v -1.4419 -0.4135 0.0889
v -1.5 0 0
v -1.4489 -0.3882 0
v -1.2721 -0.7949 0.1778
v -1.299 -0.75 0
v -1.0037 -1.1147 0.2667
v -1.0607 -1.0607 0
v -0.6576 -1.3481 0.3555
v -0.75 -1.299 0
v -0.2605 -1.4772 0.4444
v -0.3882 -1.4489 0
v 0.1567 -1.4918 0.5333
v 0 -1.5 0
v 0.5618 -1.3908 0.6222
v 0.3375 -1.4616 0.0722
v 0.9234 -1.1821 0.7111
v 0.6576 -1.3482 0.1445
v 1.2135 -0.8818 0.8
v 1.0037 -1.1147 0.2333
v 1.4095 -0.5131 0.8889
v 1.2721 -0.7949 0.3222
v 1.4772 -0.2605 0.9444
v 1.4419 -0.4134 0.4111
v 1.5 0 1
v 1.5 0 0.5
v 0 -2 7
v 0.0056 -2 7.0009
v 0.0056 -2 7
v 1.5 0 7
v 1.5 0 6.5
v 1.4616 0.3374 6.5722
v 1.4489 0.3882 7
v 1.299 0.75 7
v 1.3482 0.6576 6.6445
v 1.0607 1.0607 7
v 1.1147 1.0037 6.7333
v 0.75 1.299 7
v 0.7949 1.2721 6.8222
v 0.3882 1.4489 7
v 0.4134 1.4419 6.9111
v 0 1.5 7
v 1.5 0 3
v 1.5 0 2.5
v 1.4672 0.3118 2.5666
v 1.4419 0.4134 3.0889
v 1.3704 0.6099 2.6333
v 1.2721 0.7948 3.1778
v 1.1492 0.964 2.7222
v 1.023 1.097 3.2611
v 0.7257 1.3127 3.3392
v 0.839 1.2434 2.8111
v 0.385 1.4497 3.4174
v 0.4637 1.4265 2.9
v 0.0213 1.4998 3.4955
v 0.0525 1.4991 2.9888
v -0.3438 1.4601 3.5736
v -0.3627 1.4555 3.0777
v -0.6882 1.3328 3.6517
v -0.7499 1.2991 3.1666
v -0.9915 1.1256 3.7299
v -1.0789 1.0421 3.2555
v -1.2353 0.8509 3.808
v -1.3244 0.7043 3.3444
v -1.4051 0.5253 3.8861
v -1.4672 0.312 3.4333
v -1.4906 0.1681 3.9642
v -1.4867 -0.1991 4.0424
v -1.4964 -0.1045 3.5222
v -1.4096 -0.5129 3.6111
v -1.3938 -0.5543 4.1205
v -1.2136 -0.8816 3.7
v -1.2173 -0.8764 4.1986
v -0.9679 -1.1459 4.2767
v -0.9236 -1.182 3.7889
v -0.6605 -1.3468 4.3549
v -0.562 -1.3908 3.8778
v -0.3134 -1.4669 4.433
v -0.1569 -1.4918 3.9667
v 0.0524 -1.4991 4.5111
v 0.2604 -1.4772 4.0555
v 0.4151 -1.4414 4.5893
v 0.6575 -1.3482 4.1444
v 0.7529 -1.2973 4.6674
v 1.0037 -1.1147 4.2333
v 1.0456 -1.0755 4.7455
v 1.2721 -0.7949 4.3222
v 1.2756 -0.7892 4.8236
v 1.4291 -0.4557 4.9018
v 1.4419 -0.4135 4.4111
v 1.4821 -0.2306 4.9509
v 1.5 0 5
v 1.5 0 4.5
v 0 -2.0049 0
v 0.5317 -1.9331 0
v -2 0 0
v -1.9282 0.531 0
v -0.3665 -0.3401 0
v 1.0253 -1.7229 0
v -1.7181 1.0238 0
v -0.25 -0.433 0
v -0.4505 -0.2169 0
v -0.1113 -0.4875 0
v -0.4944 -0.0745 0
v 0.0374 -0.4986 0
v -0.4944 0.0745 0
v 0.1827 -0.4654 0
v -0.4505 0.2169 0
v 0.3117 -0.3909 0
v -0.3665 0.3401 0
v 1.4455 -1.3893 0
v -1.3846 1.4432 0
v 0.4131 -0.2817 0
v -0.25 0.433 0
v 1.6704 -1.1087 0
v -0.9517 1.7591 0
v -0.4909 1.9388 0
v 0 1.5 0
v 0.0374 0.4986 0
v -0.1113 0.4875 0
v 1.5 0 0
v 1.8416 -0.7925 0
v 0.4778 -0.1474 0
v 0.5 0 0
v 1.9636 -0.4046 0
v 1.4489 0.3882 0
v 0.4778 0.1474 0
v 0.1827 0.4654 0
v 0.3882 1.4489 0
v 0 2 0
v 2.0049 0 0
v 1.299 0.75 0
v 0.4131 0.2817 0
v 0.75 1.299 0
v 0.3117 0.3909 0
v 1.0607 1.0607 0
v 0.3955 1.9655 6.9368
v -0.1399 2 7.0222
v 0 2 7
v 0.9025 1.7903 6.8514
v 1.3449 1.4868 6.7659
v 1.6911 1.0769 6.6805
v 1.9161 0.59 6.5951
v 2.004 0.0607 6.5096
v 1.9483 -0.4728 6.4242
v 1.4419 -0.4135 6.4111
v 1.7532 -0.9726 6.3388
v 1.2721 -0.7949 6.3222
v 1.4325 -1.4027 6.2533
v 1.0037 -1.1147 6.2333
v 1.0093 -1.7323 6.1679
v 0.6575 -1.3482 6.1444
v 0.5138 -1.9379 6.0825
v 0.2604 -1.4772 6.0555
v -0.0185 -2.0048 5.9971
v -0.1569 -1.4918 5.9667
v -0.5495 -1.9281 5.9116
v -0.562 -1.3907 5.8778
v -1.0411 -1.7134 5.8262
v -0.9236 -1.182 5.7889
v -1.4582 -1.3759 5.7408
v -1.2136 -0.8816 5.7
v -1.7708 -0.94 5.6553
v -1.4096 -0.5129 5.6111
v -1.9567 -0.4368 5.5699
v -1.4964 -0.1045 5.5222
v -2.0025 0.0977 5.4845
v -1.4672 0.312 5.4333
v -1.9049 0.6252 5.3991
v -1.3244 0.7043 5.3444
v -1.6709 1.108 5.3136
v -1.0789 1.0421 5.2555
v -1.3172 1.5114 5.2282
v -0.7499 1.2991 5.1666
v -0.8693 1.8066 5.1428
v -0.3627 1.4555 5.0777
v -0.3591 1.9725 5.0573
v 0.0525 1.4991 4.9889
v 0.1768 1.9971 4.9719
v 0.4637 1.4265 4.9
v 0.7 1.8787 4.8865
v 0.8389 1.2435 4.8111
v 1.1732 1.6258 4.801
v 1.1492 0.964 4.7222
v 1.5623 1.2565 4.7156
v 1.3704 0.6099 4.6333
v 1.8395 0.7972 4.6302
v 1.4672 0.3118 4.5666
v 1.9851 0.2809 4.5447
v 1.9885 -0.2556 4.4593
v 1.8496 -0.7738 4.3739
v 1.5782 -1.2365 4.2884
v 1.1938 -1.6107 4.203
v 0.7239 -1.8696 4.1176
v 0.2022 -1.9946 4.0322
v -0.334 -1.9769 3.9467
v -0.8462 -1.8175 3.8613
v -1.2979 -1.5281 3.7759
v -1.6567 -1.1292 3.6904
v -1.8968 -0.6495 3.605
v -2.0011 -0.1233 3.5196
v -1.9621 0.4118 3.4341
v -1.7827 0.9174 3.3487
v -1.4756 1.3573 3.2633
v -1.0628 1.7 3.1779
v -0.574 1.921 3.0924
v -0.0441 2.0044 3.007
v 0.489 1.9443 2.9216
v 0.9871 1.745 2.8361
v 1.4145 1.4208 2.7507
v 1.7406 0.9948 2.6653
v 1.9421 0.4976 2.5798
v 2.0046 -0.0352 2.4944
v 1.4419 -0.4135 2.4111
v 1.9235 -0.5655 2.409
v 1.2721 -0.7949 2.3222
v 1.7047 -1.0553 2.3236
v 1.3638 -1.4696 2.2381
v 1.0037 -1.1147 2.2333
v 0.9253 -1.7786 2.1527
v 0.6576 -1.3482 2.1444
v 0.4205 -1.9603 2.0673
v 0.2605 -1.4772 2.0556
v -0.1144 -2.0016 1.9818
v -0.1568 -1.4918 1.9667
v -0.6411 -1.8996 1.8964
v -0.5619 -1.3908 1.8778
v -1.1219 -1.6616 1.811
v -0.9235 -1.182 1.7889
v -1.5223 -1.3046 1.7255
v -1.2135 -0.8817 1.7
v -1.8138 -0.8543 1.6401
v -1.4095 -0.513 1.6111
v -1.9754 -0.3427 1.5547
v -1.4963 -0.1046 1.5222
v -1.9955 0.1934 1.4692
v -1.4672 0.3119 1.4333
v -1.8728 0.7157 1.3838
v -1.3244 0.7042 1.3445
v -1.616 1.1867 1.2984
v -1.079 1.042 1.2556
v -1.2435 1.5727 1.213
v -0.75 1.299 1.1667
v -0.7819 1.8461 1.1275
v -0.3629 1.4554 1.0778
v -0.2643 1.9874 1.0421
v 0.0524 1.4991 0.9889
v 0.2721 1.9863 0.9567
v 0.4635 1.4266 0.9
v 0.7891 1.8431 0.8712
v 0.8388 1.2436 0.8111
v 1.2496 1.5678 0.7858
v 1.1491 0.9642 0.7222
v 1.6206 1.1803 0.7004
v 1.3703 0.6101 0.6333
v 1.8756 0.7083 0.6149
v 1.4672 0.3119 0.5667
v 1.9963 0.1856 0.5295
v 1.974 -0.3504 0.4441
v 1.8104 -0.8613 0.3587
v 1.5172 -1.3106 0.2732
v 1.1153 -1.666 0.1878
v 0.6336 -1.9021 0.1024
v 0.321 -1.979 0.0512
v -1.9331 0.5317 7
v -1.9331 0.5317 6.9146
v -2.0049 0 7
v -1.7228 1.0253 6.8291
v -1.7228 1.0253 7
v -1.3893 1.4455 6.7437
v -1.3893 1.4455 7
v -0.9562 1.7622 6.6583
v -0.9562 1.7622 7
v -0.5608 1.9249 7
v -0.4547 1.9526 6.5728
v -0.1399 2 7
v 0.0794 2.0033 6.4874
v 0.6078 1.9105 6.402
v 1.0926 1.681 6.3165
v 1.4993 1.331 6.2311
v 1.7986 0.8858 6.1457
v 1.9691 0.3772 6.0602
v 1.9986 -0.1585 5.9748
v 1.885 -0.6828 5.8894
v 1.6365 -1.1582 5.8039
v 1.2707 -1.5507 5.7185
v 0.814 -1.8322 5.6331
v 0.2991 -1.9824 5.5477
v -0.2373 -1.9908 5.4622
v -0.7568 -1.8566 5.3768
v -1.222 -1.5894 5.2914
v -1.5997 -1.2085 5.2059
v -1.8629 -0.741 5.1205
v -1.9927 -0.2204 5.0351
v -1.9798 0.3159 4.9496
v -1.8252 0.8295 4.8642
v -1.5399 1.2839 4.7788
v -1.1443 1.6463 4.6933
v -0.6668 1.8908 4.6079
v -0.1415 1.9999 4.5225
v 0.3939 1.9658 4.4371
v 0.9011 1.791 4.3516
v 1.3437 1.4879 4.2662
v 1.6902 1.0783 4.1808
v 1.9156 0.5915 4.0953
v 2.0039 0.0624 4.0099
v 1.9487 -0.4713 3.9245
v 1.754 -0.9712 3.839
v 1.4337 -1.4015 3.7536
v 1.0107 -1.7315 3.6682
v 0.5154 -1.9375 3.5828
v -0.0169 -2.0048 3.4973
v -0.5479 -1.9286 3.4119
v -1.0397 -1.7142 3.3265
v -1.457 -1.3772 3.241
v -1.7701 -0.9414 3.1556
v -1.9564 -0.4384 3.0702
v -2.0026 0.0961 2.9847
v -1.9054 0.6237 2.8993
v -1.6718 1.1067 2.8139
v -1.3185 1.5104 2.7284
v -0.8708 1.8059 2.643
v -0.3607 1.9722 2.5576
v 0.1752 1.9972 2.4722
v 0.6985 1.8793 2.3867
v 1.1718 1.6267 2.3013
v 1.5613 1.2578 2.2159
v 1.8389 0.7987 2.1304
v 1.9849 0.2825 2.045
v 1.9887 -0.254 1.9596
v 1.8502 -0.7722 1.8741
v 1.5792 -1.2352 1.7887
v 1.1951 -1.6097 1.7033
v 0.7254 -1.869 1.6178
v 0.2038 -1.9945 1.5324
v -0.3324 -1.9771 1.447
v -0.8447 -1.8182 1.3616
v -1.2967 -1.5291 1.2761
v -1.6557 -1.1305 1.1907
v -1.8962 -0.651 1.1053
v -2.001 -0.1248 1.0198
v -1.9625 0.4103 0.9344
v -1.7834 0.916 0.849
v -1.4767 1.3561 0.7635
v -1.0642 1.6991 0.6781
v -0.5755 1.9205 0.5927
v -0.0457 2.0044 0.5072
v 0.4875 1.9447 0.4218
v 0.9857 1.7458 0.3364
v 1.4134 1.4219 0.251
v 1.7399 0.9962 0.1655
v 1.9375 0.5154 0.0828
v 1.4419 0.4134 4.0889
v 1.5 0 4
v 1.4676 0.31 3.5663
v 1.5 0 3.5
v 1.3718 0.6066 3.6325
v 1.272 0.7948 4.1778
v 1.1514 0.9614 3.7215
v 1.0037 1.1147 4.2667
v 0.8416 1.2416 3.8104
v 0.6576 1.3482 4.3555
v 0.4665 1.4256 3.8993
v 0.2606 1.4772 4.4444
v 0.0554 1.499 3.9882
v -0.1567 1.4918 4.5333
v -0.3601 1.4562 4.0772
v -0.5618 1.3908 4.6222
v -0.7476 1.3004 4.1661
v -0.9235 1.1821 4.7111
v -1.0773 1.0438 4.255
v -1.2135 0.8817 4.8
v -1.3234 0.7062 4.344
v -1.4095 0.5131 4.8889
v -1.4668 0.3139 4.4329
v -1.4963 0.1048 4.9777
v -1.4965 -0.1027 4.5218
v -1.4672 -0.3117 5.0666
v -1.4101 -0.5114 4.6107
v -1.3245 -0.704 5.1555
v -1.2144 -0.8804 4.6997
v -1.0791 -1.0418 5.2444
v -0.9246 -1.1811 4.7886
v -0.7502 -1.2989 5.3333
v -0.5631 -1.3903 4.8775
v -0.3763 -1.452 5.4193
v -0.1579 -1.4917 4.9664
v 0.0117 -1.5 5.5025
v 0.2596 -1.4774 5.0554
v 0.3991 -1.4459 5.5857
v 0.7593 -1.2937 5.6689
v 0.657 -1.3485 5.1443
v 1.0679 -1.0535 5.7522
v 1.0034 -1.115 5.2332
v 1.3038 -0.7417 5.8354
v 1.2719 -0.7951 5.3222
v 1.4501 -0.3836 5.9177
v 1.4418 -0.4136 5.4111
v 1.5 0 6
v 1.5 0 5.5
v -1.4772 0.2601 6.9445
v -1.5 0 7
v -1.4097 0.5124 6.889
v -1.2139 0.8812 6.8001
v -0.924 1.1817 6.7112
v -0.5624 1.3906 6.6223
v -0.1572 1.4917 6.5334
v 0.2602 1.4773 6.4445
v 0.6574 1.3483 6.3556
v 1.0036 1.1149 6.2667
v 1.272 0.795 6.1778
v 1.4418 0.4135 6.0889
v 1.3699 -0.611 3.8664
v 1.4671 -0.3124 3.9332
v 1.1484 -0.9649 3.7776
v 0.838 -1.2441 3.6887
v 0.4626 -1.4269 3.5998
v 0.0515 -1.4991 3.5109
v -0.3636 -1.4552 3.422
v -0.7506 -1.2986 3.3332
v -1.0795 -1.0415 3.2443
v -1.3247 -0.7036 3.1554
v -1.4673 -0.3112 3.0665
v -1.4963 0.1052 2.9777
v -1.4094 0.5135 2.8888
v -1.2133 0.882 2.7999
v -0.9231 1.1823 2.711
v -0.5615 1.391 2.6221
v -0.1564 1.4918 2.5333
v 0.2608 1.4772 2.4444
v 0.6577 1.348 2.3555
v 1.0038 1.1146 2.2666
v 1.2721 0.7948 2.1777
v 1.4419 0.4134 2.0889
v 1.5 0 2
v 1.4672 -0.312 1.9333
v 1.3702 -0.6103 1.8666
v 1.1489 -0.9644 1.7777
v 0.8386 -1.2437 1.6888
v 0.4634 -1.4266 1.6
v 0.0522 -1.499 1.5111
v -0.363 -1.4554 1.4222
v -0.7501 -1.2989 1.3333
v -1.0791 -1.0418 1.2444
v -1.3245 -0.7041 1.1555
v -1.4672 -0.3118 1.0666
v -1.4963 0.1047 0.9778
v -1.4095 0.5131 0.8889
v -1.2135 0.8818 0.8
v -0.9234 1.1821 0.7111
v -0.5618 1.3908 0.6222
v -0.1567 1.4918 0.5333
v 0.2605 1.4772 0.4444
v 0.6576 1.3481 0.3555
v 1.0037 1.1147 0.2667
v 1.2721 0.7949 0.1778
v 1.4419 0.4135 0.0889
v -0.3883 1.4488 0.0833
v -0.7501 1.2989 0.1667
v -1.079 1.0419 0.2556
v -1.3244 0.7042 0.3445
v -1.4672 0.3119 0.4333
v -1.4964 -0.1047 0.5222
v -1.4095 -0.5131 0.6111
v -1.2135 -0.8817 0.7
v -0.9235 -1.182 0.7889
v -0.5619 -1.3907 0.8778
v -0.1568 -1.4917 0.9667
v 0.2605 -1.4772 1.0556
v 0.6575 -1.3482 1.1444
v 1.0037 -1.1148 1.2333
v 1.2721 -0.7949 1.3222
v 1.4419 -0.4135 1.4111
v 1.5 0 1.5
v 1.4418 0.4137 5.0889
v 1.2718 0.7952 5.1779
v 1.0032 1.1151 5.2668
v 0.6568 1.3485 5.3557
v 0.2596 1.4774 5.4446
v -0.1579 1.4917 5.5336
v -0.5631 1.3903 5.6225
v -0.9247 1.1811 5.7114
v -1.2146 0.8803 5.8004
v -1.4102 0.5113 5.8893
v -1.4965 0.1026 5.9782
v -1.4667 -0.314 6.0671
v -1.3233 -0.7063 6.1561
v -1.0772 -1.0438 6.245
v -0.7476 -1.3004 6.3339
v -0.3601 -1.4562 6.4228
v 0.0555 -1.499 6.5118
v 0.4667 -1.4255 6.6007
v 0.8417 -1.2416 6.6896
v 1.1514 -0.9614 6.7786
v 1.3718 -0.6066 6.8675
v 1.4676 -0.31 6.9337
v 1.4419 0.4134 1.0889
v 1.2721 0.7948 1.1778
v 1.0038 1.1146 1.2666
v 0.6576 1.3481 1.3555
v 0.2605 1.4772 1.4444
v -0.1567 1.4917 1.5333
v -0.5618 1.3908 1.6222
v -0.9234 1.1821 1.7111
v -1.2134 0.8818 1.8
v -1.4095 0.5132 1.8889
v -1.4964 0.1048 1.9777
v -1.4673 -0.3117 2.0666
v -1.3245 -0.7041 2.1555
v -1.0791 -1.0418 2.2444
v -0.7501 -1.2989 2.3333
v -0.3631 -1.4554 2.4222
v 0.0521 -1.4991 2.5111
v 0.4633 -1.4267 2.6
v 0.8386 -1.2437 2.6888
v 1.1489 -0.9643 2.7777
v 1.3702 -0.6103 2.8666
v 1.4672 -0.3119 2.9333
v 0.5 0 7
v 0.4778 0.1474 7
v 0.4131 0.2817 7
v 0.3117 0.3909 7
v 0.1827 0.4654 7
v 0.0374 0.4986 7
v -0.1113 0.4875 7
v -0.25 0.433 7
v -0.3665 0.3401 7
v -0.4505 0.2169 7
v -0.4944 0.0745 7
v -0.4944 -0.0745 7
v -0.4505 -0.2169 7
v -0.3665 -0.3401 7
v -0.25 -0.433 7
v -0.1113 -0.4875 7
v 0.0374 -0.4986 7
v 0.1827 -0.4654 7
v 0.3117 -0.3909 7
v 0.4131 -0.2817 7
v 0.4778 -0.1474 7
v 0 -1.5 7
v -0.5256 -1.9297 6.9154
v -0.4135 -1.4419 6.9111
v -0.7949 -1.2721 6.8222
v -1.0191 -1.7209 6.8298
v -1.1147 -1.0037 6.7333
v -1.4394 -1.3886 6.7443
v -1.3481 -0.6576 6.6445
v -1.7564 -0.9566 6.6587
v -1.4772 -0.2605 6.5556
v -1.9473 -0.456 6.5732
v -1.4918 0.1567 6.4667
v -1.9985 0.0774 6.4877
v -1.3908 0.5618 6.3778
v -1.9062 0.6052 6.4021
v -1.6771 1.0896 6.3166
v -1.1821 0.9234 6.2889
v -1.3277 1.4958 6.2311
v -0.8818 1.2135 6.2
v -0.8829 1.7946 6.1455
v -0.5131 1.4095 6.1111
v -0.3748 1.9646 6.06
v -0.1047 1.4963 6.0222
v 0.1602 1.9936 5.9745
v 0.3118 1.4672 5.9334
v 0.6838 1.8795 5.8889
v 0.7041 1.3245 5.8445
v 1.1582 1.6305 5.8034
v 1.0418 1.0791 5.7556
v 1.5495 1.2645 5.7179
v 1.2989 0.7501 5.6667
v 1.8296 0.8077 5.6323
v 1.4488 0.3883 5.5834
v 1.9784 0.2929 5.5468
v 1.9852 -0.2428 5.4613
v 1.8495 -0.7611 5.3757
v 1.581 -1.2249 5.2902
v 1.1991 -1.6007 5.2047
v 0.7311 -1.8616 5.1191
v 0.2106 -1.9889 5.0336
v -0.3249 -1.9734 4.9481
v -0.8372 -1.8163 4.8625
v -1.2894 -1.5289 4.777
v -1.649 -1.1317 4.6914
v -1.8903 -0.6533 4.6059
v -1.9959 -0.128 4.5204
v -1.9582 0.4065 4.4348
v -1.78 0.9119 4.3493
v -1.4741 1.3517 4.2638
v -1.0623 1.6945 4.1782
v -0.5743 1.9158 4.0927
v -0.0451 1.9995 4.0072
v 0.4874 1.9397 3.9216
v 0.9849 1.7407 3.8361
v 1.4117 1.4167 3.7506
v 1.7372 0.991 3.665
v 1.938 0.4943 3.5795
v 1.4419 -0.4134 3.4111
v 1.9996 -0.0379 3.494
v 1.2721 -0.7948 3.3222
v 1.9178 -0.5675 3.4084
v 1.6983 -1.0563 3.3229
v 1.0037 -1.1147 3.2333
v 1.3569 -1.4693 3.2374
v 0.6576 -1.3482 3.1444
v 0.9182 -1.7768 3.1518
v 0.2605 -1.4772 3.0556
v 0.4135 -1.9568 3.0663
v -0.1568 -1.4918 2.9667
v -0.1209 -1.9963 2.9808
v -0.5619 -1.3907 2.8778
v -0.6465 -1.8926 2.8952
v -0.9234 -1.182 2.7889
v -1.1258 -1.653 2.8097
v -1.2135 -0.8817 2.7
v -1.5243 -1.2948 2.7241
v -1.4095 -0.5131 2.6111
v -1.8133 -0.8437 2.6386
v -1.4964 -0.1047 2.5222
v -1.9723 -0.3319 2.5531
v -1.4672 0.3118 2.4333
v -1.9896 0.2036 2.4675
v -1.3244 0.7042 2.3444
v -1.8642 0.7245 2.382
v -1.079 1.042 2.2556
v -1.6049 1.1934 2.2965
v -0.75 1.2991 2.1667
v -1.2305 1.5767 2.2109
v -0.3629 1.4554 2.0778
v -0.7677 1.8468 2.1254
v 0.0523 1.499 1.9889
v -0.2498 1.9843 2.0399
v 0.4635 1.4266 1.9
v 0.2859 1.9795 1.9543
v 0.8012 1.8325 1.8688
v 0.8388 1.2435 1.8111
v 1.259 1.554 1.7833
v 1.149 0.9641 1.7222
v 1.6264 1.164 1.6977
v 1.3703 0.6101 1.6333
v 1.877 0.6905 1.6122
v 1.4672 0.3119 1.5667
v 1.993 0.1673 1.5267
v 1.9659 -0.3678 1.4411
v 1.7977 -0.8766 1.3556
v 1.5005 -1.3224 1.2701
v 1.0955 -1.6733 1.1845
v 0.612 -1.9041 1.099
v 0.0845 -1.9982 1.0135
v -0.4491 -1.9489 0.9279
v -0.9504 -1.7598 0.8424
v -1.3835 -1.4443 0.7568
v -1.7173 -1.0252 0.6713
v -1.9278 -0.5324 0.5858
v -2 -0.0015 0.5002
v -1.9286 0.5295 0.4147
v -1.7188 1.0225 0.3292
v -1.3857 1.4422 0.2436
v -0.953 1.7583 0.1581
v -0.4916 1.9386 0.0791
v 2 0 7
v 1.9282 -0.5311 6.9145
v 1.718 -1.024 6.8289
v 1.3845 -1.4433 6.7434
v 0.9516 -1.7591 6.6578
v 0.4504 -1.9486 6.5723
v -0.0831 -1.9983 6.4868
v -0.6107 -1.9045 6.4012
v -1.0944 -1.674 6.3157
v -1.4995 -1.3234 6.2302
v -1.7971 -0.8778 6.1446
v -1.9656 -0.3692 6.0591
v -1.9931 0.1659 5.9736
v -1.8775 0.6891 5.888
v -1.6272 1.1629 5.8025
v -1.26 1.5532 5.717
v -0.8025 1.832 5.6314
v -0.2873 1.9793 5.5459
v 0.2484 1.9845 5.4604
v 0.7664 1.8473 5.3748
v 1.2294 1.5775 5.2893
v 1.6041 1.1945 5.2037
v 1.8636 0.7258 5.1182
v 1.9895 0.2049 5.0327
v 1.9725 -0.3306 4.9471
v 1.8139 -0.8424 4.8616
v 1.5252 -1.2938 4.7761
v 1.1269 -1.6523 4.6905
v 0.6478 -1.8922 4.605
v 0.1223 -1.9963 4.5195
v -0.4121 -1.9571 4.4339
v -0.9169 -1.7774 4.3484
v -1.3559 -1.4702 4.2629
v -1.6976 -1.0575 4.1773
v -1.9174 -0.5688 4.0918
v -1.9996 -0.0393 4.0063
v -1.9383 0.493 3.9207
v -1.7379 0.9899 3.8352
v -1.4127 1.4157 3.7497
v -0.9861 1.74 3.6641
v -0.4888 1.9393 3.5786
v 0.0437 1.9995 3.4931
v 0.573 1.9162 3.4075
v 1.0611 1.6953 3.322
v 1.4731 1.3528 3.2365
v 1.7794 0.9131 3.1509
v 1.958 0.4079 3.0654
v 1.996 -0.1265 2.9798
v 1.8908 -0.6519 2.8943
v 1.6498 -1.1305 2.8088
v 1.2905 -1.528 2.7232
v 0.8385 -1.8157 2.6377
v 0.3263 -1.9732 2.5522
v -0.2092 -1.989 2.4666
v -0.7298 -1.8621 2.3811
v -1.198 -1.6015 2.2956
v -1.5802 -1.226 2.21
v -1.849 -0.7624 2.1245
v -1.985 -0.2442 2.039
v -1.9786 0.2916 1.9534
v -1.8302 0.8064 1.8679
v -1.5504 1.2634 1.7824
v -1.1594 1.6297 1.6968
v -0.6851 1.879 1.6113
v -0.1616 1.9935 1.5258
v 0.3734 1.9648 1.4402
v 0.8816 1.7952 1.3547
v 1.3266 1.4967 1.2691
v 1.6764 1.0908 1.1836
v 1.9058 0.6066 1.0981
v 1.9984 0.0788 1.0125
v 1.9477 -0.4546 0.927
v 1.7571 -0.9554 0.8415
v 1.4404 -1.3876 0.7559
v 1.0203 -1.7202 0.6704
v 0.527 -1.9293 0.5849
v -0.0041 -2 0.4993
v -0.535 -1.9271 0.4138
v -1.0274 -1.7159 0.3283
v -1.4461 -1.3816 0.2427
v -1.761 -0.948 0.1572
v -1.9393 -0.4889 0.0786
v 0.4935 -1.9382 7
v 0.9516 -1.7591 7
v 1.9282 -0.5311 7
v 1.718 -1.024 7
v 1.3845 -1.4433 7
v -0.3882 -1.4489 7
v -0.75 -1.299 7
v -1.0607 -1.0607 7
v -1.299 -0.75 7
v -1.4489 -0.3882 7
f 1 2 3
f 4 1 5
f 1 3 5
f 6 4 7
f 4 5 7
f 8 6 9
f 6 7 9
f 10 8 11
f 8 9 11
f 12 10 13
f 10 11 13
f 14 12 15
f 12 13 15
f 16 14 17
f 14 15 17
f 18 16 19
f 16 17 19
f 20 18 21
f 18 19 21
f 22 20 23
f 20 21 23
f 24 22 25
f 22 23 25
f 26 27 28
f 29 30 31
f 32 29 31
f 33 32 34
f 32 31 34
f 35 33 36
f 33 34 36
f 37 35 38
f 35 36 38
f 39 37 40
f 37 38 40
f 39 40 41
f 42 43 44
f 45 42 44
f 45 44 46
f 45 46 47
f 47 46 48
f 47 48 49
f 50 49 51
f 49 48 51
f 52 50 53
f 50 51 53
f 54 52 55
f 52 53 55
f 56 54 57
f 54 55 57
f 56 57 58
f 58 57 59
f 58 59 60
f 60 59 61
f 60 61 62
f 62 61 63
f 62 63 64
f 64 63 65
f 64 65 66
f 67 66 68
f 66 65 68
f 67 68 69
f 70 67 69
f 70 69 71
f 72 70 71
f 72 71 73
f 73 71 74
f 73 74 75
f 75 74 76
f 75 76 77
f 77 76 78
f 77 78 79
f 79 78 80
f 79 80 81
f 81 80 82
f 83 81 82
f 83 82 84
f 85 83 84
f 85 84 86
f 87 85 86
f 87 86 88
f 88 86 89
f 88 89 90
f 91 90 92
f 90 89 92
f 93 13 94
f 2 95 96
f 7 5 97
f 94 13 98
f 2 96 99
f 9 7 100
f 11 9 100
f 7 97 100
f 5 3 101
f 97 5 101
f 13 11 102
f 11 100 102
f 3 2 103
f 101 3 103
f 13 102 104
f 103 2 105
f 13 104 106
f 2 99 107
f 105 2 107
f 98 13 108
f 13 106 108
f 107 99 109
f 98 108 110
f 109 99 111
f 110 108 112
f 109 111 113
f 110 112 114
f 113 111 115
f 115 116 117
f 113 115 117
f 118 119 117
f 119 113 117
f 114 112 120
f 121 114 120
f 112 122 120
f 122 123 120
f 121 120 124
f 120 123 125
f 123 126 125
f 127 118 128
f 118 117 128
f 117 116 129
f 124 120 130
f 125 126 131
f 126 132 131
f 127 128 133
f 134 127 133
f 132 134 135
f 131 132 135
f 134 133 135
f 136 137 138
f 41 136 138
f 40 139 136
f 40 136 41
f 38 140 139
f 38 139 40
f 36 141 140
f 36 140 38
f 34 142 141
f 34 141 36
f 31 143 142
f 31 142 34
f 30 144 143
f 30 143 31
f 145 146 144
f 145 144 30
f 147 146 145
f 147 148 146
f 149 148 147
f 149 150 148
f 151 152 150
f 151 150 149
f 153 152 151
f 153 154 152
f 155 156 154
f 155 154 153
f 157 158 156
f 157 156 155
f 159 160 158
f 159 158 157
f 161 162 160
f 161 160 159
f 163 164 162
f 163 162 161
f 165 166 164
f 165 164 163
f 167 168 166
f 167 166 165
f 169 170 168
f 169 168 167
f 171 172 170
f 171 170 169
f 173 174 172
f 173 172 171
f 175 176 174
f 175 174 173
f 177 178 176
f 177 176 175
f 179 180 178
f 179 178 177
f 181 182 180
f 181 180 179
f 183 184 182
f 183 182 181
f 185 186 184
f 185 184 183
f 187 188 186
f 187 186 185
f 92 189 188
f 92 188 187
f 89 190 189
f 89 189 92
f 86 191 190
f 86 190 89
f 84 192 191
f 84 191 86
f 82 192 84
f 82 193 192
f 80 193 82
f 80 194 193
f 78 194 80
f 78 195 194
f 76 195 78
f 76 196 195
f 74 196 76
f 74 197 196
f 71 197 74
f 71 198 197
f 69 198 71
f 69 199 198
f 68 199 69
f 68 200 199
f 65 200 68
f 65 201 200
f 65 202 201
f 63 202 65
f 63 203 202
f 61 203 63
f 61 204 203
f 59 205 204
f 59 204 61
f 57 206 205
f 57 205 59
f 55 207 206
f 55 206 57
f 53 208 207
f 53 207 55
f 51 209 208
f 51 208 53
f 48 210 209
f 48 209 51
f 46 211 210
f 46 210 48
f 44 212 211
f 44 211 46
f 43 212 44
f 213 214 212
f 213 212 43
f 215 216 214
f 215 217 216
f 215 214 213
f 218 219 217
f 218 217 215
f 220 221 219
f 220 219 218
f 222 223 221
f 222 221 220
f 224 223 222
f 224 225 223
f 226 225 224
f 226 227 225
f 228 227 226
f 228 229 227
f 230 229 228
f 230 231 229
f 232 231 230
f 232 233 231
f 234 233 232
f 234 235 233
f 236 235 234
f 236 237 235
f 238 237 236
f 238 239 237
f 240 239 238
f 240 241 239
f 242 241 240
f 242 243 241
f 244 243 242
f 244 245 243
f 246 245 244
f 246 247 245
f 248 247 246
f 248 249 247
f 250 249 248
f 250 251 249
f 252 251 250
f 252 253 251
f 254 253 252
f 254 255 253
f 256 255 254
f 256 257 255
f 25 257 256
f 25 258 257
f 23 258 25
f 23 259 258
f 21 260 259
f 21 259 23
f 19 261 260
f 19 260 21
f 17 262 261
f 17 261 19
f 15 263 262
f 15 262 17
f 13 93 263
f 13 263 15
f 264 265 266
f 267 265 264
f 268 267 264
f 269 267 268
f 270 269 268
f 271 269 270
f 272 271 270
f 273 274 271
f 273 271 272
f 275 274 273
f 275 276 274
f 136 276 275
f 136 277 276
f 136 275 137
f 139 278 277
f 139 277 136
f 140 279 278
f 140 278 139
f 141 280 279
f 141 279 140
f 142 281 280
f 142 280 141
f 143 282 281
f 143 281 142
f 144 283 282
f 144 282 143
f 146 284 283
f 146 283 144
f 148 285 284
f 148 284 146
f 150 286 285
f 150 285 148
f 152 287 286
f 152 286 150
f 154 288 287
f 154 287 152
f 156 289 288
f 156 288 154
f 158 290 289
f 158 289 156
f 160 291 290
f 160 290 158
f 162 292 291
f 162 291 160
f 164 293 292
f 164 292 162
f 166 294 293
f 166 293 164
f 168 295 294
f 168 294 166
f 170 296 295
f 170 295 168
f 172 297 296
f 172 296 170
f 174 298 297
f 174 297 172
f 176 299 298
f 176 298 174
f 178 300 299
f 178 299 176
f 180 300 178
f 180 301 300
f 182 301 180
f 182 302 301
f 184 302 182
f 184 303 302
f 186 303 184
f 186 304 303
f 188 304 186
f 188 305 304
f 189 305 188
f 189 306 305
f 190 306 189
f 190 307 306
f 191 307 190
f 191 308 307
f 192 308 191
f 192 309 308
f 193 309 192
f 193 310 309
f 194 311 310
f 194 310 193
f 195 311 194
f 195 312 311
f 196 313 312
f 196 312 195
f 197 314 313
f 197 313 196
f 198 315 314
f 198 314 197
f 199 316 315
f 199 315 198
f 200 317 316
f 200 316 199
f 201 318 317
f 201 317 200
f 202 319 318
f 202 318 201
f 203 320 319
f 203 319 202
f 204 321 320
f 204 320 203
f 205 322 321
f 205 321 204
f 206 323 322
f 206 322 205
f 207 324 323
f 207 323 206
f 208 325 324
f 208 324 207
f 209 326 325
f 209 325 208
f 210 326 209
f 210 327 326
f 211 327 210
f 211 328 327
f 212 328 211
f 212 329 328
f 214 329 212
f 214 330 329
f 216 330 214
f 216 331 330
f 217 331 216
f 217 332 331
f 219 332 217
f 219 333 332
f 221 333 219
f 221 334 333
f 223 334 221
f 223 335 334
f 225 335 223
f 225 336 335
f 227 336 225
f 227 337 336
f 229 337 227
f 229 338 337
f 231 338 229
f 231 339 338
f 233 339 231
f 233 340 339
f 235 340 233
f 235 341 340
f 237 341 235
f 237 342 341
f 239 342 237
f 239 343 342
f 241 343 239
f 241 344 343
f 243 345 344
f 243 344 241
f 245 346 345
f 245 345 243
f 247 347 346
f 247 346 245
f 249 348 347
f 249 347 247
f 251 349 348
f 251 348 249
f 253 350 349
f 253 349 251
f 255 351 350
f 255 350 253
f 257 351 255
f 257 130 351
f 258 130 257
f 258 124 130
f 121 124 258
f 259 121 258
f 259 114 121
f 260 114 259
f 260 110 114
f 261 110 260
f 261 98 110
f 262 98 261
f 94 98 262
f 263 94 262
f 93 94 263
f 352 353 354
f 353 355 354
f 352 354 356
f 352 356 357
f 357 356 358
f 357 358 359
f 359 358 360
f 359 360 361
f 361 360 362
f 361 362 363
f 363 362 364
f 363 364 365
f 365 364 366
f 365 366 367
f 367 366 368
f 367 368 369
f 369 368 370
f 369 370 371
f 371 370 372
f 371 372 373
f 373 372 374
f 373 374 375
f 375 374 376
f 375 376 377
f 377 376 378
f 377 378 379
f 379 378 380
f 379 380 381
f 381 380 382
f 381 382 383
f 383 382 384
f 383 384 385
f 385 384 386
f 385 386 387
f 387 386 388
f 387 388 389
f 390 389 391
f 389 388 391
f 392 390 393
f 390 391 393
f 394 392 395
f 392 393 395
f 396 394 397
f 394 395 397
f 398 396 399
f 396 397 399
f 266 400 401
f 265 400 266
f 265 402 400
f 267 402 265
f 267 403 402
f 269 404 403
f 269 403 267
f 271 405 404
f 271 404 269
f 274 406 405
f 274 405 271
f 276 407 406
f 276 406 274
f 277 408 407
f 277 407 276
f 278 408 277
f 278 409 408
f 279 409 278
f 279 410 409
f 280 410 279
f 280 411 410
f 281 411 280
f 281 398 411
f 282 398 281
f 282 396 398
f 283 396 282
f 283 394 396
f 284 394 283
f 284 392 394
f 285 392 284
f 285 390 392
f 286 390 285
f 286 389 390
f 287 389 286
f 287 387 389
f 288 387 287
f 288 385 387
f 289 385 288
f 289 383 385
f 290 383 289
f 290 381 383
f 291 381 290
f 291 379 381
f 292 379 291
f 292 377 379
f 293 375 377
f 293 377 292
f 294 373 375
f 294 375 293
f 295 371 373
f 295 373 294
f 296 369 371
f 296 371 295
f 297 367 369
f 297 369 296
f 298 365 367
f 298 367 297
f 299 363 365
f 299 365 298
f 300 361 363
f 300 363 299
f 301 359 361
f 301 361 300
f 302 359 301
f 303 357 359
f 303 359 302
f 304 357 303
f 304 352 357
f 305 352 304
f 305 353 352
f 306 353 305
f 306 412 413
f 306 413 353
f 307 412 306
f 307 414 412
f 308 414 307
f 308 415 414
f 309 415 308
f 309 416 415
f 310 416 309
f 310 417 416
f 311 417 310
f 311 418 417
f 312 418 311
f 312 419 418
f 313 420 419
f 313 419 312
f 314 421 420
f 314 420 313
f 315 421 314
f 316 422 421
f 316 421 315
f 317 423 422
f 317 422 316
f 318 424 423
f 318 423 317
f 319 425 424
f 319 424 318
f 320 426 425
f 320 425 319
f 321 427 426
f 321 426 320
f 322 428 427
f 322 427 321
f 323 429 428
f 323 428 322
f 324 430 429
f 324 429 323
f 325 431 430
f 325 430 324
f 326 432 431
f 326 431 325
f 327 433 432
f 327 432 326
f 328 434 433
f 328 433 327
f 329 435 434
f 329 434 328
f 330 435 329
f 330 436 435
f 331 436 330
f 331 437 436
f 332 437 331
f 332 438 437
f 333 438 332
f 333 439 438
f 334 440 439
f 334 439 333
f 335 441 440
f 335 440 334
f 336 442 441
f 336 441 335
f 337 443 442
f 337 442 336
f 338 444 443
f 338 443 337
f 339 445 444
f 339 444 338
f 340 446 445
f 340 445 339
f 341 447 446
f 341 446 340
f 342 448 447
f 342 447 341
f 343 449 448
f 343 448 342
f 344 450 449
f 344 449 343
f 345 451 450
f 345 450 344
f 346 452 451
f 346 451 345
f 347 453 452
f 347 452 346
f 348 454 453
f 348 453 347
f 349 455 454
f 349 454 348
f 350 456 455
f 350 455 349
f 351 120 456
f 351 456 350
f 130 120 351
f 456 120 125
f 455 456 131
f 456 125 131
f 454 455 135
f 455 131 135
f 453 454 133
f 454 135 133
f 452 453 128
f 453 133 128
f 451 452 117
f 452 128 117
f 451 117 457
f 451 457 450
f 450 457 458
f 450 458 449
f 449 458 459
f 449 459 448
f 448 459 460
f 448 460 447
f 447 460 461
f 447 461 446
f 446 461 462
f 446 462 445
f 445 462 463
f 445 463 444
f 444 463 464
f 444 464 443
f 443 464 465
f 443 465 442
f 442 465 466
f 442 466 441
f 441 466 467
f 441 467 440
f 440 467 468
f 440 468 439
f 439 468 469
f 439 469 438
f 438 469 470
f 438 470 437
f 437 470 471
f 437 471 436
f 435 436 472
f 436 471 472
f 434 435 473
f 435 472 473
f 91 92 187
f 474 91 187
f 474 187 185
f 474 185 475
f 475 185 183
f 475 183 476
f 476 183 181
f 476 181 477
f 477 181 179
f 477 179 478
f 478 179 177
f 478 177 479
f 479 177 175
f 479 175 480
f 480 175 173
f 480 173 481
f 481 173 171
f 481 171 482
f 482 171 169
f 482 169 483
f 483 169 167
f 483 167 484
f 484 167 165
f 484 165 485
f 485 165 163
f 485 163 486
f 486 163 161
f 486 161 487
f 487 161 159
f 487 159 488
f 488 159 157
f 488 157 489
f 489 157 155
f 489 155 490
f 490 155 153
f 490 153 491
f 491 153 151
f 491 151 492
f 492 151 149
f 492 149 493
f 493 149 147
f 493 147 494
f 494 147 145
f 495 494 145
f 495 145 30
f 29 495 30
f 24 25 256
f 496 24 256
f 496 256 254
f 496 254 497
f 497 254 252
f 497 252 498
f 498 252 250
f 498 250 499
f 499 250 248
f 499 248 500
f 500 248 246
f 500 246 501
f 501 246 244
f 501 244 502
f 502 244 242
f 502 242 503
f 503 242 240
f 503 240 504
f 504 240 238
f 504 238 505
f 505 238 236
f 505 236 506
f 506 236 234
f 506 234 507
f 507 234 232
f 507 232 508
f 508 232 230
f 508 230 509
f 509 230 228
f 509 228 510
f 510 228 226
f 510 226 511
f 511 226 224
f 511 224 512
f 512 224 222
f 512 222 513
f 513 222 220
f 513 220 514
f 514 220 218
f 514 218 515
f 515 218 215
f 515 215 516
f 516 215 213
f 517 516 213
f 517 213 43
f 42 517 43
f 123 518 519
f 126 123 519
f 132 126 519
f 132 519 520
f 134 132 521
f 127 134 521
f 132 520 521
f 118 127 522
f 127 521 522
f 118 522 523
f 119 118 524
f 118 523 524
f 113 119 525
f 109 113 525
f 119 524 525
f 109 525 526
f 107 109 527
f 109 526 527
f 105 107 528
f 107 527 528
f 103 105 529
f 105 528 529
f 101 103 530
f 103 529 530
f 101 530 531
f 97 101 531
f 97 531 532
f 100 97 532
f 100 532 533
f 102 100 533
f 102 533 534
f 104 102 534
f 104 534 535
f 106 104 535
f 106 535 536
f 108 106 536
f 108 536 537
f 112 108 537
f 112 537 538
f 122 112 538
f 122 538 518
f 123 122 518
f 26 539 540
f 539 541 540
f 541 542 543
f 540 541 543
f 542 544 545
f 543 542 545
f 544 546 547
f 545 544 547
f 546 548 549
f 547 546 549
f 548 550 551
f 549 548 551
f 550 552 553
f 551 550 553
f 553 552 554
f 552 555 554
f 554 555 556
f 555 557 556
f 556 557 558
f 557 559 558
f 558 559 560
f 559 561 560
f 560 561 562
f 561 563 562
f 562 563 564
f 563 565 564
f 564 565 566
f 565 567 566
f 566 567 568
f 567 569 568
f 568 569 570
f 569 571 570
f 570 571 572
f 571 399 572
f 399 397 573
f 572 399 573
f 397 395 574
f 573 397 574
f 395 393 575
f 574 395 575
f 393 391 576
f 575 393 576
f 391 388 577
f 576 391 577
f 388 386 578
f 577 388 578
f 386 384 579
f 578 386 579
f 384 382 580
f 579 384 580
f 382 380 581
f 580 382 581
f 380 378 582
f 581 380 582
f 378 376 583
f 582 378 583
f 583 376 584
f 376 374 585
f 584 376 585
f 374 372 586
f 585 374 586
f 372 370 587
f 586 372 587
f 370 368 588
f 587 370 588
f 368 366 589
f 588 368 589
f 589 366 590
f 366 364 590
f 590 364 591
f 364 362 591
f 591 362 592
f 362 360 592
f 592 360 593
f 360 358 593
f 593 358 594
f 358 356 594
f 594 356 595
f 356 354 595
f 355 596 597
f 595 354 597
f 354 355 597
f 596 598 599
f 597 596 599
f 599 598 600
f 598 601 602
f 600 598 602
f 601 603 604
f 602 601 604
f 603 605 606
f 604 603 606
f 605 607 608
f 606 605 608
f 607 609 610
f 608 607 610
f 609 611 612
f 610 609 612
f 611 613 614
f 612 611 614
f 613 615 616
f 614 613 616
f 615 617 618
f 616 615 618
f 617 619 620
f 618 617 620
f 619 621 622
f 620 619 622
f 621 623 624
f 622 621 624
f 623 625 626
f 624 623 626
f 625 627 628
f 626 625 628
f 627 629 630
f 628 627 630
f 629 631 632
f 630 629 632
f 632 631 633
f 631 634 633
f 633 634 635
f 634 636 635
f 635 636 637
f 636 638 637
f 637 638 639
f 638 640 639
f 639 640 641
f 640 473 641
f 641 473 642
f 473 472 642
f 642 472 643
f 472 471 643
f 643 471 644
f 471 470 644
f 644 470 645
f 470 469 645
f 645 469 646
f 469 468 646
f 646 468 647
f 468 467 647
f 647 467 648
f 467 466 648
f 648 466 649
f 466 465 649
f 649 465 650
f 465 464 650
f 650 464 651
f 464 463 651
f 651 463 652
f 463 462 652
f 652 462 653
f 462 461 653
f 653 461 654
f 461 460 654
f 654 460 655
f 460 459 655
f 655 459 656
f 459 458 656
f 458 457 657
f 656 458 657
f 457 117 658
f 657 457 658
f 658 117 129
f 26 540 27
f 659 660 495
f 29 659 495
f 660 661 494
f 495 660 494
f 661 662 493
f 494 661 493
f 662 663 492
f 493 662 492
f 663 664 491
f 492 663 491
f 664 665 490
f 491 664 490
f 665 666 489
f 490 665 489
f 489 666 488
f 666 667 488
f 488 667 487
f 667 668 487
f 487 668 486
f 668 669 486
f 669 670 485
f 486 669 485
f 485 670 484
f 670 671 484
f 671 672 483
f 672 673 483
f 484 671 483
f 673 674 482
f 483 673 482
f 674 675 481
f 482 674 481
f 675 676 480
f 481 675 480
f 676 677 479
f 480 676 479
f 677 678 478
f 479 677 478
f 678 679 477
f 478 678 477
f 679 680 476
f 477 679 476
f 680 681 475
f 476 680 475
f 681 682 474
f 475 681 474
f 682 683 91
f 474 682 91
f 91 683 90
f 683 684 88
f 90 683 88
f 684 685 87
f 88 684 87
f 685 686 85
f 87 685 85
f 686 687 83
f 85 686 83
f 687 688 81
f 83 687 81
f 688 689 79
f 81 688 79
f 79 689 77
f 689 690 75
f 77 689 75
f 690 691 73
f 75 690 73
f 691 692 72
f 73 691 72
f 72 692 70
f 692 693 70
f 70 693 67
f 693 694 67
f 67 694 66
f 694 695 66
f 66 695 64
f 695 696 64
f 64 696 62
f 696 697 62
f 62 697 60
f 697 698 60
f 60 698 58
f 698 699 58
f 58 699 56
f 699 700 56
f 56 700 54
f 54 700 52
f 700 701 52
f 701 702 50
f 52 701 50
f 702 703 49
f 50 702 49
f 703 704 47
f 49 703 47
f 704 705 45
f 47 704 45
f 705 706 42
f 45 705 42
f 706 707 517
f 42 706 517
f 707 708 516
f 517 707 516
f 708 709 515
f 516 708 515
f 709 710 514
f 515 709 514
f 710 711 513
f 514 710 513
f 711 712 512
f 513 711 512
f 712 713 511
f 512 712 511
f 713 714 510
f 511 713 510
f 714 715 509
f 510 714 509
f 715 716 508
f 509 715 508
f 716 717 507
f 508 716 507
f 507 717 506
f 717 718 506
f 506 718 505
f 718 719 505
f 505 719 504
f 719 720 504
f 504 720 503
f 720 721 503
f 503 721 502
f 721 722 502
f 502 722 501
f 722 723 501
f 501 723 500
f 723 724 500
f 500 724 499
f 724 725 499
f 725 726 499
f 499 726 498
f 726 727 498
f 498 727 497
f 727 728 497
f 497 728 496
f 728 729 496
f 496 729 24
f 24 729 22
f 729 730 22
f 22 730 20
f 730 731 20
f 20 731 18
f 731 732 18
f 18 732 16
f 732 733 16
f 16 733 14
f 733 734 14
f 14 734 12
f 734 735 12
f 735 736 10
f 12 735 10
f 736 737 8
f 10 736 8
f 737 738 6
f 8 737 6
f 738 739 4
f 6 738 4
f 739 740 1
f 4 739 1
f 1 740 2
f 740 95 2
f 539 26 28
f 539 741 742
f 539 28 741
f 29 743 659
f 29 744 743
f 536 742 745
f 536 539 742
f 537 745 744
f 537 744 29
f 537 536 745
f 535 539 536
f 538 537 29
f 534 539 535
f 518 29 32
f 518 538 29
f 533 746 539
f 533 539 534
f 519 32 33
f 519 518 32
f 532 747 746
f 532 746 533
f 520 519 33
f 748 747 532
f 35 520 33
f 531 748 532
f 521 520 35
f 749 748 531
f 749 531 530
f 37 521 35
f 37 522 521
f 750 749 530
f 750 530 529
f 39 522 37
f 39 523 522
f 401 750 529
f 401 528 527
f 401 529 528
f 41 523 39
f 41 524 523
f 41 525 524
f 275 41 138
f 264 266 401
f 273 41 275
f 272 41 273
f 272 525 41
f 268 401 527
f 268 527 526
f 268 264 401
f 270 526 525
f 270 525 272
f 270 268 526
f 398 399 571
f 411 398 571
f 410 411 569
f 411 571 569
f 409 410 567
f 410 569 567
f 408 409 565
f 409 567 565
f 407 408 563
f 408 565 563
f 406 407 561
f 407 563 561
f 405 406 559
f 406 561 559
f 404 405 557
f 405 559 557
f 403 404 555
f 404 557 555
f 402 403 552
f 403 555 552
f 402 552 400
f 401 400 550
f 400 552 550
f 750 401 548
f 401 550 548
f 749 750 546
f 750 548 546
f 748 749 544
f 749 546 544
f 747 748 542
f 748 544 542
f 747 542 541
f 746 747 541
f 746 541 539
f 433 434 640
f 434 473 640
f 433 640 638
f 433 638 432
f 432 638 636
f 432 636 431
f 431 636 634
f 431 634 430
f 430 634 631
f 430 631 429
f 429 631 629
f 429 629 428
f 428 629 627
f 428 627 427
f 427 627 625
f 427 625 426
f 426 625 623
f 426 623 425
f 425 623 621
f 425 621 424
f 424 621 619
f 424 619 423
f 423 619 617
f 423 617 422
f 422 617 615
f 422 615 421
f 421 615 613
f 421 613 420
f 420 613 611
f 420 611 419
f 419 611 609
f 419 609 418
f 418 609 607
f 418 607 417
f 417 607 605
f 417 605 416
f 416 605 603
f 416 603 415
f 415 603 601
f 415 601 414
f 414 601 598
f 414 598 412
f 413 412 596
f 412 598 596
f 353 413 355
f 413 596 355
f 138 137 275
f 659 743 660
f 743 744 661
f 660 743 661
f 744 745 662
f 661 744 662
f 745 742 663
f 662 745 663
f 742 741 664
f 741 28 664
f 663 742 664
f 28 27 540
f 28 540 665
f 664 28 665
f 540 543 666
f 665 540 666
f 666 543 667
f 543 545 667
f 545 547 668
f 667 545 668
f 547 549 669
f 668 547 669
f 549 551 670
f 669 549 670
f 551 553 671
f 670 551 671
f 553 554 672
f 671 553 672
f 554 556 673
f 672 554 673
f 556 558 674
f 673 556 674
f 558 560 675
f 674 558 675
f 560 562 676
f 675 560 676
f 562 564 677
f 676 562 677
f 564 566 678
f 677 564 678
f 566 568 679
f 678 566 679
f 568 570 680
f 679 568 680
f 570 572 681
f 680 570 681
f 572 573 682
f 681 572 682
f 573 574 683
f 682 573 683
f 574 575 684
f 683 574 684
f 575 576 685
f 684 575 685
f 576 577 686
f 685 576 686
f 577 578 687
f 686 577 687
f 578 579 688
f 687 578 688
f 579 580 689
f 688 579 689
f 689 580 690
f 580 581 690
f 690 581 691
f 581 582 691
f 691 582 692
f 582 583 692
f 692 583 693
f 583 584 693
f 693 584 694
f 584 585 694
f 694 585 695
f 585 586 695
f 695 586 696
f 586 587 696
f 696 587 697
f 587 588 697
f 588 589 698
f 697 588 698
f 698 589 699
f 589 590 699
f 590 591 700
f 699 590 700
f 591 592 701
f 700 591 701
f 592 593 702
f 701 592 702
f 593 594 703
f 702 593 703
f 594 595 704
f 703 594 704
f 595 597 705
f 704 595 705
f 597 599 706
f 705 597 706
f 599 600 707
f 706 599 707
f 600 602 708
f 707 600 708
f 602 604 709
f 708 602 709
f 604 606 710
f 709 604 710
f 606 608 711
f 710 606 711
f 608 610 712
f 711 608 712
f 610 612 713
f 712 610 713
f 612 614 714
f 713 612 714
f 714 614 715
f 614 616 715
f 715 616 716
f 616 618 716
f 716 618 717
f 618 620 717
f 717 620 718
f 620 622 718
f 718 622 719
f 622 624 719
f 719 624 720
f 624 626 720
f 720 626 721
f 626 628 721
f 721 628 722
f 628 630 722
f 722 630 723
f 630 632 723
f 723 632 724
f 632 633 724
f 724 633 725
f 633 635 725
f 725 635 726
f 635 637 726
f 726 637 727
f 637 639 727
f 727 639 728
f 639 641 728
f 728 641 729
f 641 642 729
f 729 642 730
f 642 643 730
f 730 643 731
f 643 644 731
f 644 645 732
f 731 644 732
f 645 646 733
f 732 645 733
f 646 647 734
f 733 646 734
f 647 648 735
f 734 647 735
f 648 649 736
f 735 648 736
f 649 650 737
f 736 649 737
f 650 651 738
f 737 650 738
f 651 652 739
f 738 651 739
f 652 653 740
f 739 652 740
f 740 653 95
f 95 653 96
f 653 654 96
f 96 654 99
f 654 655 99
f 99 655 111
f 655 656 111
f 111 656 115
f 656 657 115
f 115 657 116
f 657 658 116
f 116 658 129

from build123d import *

# Parameters (mm, degrees)
SKETCH2_R               = 1.5
BOSS_EXTRUDE1_DEPTH     = 7
SWEEP1_PITCH            = 2
SWEEP1_HEIGHT           = 7.5
SWEEP1_RADIUS           = 2
SKETCH5_W               = 0.50487755
SKETCH5_H               = 0.5
SWEEP2_PITCH            = 2
SWEEP2_HEIGHT           = 7.5
SWEEP2_RADIUS           = 2
SWEEP2_START_ANGLE      = 180
SKETCH6_W               = 0.5
SKETCH6_H               = 0.5
CUT_EXTRUDE1_DEPTH      = 9.018050785
CUT_EXTRUDE1_DEPTH_BACK = 9.018050785
SKETCH8_W               = 0.5
SKETCH8_H               = 4
SKETCH8_H_2             = 4.221172624
SKETCH9_R               = 0.5
CUT_EXTRUDE2_DEPTH      = 8.552425988


with BuildPart() as part:
    # Sketch2 → Boss-Extrude1 (new body)
    with BuildSketch(Plane.XY):
        Circle(SKETCH2_R)
    extrude(amount=BOSS_EXTRUDE1_DEPTH)

    # Sweep1: sweep along a helix
    with BuildLine() as sweep1_path:
        Helix(SWEEP1_PITCH, SWEEP1_HEIGHT, SWEEP1_RADIUS, center=(0, 0, 7.5), direction=(0, 0, -1))
    # Sketch5 → Sweep1 (sweep)
    with BuildSketch(Plane(origin=(0, 0, 0), x_dir=(1, 0, 0), z_dir=(0, 1, 0))):
        with Locations((-1.752438775, -7.25)):
            Rectangle(SKETCH5_W, SKETCH5_H)
    sweep(path=sweep1_path.line, is_frenet=True)

    # Sweep2: sweep along a helix
    with BuildLine() as sweep2_path:
        add(Helix(SWEEP2_PITCH, SWEEP2_HEIGHT, SWEEP2_RADIUS, center=(0, 0, 7.5), direction=(0, 0, -1), mode=Mode.PRIVATE).rotate(Axis((0, 0, 7.5), (0, 0, -1)), SWEEP2_START_ANGLE))
    # Sketch6 → Sweep2 (sweep)
    with BuildSketch(Plane(origin=(0, 0, 0), x_dir=(1, 0, 0), z_dir=(0, 1, 0))):
        with Locations((1.75, -7.25)):
            Rectangle(SKETCH6_W, SKETCH6_H)
    sweep(path=sweep2_path.line, is_frenet=True)

    # Sketch8 → Cut-Extrude1 (cut, two sides: drawn at the far end of the back side and taken through both)
    with BuildSketch(Plane(origin=(0, 0, 0), x_dir=(0, 0, -1), z_dir=(1, 0, 0)).offset(-CUT_EXTRUDE1_DEPTH_BACK)):
        with Locations((-7.25, 0)):
            Rectangle(SKETCH8_W, SKETCH8_H)
        with Locations((0.25, -0.110586312)):
            Rectangle(SKETCH8_W, SKETCH8_H_2)
    extrude(amount=CUT_EXTRUDE1_DEPTH + CUT_EXTRUDE1_DEPTH_BACK, mode=Mode.SUBTRACT)

    # Sketch9 → Cut-Extrude2 (cut, through all)
    with BuildSketch(Plane.XY.offset(7)):
        Circle(SKETCH9_R)
    extrude(amount=-CUT_EXTRUDE2_DEPTH, mode=Mode.SUBTRACT)


solid = part.part
